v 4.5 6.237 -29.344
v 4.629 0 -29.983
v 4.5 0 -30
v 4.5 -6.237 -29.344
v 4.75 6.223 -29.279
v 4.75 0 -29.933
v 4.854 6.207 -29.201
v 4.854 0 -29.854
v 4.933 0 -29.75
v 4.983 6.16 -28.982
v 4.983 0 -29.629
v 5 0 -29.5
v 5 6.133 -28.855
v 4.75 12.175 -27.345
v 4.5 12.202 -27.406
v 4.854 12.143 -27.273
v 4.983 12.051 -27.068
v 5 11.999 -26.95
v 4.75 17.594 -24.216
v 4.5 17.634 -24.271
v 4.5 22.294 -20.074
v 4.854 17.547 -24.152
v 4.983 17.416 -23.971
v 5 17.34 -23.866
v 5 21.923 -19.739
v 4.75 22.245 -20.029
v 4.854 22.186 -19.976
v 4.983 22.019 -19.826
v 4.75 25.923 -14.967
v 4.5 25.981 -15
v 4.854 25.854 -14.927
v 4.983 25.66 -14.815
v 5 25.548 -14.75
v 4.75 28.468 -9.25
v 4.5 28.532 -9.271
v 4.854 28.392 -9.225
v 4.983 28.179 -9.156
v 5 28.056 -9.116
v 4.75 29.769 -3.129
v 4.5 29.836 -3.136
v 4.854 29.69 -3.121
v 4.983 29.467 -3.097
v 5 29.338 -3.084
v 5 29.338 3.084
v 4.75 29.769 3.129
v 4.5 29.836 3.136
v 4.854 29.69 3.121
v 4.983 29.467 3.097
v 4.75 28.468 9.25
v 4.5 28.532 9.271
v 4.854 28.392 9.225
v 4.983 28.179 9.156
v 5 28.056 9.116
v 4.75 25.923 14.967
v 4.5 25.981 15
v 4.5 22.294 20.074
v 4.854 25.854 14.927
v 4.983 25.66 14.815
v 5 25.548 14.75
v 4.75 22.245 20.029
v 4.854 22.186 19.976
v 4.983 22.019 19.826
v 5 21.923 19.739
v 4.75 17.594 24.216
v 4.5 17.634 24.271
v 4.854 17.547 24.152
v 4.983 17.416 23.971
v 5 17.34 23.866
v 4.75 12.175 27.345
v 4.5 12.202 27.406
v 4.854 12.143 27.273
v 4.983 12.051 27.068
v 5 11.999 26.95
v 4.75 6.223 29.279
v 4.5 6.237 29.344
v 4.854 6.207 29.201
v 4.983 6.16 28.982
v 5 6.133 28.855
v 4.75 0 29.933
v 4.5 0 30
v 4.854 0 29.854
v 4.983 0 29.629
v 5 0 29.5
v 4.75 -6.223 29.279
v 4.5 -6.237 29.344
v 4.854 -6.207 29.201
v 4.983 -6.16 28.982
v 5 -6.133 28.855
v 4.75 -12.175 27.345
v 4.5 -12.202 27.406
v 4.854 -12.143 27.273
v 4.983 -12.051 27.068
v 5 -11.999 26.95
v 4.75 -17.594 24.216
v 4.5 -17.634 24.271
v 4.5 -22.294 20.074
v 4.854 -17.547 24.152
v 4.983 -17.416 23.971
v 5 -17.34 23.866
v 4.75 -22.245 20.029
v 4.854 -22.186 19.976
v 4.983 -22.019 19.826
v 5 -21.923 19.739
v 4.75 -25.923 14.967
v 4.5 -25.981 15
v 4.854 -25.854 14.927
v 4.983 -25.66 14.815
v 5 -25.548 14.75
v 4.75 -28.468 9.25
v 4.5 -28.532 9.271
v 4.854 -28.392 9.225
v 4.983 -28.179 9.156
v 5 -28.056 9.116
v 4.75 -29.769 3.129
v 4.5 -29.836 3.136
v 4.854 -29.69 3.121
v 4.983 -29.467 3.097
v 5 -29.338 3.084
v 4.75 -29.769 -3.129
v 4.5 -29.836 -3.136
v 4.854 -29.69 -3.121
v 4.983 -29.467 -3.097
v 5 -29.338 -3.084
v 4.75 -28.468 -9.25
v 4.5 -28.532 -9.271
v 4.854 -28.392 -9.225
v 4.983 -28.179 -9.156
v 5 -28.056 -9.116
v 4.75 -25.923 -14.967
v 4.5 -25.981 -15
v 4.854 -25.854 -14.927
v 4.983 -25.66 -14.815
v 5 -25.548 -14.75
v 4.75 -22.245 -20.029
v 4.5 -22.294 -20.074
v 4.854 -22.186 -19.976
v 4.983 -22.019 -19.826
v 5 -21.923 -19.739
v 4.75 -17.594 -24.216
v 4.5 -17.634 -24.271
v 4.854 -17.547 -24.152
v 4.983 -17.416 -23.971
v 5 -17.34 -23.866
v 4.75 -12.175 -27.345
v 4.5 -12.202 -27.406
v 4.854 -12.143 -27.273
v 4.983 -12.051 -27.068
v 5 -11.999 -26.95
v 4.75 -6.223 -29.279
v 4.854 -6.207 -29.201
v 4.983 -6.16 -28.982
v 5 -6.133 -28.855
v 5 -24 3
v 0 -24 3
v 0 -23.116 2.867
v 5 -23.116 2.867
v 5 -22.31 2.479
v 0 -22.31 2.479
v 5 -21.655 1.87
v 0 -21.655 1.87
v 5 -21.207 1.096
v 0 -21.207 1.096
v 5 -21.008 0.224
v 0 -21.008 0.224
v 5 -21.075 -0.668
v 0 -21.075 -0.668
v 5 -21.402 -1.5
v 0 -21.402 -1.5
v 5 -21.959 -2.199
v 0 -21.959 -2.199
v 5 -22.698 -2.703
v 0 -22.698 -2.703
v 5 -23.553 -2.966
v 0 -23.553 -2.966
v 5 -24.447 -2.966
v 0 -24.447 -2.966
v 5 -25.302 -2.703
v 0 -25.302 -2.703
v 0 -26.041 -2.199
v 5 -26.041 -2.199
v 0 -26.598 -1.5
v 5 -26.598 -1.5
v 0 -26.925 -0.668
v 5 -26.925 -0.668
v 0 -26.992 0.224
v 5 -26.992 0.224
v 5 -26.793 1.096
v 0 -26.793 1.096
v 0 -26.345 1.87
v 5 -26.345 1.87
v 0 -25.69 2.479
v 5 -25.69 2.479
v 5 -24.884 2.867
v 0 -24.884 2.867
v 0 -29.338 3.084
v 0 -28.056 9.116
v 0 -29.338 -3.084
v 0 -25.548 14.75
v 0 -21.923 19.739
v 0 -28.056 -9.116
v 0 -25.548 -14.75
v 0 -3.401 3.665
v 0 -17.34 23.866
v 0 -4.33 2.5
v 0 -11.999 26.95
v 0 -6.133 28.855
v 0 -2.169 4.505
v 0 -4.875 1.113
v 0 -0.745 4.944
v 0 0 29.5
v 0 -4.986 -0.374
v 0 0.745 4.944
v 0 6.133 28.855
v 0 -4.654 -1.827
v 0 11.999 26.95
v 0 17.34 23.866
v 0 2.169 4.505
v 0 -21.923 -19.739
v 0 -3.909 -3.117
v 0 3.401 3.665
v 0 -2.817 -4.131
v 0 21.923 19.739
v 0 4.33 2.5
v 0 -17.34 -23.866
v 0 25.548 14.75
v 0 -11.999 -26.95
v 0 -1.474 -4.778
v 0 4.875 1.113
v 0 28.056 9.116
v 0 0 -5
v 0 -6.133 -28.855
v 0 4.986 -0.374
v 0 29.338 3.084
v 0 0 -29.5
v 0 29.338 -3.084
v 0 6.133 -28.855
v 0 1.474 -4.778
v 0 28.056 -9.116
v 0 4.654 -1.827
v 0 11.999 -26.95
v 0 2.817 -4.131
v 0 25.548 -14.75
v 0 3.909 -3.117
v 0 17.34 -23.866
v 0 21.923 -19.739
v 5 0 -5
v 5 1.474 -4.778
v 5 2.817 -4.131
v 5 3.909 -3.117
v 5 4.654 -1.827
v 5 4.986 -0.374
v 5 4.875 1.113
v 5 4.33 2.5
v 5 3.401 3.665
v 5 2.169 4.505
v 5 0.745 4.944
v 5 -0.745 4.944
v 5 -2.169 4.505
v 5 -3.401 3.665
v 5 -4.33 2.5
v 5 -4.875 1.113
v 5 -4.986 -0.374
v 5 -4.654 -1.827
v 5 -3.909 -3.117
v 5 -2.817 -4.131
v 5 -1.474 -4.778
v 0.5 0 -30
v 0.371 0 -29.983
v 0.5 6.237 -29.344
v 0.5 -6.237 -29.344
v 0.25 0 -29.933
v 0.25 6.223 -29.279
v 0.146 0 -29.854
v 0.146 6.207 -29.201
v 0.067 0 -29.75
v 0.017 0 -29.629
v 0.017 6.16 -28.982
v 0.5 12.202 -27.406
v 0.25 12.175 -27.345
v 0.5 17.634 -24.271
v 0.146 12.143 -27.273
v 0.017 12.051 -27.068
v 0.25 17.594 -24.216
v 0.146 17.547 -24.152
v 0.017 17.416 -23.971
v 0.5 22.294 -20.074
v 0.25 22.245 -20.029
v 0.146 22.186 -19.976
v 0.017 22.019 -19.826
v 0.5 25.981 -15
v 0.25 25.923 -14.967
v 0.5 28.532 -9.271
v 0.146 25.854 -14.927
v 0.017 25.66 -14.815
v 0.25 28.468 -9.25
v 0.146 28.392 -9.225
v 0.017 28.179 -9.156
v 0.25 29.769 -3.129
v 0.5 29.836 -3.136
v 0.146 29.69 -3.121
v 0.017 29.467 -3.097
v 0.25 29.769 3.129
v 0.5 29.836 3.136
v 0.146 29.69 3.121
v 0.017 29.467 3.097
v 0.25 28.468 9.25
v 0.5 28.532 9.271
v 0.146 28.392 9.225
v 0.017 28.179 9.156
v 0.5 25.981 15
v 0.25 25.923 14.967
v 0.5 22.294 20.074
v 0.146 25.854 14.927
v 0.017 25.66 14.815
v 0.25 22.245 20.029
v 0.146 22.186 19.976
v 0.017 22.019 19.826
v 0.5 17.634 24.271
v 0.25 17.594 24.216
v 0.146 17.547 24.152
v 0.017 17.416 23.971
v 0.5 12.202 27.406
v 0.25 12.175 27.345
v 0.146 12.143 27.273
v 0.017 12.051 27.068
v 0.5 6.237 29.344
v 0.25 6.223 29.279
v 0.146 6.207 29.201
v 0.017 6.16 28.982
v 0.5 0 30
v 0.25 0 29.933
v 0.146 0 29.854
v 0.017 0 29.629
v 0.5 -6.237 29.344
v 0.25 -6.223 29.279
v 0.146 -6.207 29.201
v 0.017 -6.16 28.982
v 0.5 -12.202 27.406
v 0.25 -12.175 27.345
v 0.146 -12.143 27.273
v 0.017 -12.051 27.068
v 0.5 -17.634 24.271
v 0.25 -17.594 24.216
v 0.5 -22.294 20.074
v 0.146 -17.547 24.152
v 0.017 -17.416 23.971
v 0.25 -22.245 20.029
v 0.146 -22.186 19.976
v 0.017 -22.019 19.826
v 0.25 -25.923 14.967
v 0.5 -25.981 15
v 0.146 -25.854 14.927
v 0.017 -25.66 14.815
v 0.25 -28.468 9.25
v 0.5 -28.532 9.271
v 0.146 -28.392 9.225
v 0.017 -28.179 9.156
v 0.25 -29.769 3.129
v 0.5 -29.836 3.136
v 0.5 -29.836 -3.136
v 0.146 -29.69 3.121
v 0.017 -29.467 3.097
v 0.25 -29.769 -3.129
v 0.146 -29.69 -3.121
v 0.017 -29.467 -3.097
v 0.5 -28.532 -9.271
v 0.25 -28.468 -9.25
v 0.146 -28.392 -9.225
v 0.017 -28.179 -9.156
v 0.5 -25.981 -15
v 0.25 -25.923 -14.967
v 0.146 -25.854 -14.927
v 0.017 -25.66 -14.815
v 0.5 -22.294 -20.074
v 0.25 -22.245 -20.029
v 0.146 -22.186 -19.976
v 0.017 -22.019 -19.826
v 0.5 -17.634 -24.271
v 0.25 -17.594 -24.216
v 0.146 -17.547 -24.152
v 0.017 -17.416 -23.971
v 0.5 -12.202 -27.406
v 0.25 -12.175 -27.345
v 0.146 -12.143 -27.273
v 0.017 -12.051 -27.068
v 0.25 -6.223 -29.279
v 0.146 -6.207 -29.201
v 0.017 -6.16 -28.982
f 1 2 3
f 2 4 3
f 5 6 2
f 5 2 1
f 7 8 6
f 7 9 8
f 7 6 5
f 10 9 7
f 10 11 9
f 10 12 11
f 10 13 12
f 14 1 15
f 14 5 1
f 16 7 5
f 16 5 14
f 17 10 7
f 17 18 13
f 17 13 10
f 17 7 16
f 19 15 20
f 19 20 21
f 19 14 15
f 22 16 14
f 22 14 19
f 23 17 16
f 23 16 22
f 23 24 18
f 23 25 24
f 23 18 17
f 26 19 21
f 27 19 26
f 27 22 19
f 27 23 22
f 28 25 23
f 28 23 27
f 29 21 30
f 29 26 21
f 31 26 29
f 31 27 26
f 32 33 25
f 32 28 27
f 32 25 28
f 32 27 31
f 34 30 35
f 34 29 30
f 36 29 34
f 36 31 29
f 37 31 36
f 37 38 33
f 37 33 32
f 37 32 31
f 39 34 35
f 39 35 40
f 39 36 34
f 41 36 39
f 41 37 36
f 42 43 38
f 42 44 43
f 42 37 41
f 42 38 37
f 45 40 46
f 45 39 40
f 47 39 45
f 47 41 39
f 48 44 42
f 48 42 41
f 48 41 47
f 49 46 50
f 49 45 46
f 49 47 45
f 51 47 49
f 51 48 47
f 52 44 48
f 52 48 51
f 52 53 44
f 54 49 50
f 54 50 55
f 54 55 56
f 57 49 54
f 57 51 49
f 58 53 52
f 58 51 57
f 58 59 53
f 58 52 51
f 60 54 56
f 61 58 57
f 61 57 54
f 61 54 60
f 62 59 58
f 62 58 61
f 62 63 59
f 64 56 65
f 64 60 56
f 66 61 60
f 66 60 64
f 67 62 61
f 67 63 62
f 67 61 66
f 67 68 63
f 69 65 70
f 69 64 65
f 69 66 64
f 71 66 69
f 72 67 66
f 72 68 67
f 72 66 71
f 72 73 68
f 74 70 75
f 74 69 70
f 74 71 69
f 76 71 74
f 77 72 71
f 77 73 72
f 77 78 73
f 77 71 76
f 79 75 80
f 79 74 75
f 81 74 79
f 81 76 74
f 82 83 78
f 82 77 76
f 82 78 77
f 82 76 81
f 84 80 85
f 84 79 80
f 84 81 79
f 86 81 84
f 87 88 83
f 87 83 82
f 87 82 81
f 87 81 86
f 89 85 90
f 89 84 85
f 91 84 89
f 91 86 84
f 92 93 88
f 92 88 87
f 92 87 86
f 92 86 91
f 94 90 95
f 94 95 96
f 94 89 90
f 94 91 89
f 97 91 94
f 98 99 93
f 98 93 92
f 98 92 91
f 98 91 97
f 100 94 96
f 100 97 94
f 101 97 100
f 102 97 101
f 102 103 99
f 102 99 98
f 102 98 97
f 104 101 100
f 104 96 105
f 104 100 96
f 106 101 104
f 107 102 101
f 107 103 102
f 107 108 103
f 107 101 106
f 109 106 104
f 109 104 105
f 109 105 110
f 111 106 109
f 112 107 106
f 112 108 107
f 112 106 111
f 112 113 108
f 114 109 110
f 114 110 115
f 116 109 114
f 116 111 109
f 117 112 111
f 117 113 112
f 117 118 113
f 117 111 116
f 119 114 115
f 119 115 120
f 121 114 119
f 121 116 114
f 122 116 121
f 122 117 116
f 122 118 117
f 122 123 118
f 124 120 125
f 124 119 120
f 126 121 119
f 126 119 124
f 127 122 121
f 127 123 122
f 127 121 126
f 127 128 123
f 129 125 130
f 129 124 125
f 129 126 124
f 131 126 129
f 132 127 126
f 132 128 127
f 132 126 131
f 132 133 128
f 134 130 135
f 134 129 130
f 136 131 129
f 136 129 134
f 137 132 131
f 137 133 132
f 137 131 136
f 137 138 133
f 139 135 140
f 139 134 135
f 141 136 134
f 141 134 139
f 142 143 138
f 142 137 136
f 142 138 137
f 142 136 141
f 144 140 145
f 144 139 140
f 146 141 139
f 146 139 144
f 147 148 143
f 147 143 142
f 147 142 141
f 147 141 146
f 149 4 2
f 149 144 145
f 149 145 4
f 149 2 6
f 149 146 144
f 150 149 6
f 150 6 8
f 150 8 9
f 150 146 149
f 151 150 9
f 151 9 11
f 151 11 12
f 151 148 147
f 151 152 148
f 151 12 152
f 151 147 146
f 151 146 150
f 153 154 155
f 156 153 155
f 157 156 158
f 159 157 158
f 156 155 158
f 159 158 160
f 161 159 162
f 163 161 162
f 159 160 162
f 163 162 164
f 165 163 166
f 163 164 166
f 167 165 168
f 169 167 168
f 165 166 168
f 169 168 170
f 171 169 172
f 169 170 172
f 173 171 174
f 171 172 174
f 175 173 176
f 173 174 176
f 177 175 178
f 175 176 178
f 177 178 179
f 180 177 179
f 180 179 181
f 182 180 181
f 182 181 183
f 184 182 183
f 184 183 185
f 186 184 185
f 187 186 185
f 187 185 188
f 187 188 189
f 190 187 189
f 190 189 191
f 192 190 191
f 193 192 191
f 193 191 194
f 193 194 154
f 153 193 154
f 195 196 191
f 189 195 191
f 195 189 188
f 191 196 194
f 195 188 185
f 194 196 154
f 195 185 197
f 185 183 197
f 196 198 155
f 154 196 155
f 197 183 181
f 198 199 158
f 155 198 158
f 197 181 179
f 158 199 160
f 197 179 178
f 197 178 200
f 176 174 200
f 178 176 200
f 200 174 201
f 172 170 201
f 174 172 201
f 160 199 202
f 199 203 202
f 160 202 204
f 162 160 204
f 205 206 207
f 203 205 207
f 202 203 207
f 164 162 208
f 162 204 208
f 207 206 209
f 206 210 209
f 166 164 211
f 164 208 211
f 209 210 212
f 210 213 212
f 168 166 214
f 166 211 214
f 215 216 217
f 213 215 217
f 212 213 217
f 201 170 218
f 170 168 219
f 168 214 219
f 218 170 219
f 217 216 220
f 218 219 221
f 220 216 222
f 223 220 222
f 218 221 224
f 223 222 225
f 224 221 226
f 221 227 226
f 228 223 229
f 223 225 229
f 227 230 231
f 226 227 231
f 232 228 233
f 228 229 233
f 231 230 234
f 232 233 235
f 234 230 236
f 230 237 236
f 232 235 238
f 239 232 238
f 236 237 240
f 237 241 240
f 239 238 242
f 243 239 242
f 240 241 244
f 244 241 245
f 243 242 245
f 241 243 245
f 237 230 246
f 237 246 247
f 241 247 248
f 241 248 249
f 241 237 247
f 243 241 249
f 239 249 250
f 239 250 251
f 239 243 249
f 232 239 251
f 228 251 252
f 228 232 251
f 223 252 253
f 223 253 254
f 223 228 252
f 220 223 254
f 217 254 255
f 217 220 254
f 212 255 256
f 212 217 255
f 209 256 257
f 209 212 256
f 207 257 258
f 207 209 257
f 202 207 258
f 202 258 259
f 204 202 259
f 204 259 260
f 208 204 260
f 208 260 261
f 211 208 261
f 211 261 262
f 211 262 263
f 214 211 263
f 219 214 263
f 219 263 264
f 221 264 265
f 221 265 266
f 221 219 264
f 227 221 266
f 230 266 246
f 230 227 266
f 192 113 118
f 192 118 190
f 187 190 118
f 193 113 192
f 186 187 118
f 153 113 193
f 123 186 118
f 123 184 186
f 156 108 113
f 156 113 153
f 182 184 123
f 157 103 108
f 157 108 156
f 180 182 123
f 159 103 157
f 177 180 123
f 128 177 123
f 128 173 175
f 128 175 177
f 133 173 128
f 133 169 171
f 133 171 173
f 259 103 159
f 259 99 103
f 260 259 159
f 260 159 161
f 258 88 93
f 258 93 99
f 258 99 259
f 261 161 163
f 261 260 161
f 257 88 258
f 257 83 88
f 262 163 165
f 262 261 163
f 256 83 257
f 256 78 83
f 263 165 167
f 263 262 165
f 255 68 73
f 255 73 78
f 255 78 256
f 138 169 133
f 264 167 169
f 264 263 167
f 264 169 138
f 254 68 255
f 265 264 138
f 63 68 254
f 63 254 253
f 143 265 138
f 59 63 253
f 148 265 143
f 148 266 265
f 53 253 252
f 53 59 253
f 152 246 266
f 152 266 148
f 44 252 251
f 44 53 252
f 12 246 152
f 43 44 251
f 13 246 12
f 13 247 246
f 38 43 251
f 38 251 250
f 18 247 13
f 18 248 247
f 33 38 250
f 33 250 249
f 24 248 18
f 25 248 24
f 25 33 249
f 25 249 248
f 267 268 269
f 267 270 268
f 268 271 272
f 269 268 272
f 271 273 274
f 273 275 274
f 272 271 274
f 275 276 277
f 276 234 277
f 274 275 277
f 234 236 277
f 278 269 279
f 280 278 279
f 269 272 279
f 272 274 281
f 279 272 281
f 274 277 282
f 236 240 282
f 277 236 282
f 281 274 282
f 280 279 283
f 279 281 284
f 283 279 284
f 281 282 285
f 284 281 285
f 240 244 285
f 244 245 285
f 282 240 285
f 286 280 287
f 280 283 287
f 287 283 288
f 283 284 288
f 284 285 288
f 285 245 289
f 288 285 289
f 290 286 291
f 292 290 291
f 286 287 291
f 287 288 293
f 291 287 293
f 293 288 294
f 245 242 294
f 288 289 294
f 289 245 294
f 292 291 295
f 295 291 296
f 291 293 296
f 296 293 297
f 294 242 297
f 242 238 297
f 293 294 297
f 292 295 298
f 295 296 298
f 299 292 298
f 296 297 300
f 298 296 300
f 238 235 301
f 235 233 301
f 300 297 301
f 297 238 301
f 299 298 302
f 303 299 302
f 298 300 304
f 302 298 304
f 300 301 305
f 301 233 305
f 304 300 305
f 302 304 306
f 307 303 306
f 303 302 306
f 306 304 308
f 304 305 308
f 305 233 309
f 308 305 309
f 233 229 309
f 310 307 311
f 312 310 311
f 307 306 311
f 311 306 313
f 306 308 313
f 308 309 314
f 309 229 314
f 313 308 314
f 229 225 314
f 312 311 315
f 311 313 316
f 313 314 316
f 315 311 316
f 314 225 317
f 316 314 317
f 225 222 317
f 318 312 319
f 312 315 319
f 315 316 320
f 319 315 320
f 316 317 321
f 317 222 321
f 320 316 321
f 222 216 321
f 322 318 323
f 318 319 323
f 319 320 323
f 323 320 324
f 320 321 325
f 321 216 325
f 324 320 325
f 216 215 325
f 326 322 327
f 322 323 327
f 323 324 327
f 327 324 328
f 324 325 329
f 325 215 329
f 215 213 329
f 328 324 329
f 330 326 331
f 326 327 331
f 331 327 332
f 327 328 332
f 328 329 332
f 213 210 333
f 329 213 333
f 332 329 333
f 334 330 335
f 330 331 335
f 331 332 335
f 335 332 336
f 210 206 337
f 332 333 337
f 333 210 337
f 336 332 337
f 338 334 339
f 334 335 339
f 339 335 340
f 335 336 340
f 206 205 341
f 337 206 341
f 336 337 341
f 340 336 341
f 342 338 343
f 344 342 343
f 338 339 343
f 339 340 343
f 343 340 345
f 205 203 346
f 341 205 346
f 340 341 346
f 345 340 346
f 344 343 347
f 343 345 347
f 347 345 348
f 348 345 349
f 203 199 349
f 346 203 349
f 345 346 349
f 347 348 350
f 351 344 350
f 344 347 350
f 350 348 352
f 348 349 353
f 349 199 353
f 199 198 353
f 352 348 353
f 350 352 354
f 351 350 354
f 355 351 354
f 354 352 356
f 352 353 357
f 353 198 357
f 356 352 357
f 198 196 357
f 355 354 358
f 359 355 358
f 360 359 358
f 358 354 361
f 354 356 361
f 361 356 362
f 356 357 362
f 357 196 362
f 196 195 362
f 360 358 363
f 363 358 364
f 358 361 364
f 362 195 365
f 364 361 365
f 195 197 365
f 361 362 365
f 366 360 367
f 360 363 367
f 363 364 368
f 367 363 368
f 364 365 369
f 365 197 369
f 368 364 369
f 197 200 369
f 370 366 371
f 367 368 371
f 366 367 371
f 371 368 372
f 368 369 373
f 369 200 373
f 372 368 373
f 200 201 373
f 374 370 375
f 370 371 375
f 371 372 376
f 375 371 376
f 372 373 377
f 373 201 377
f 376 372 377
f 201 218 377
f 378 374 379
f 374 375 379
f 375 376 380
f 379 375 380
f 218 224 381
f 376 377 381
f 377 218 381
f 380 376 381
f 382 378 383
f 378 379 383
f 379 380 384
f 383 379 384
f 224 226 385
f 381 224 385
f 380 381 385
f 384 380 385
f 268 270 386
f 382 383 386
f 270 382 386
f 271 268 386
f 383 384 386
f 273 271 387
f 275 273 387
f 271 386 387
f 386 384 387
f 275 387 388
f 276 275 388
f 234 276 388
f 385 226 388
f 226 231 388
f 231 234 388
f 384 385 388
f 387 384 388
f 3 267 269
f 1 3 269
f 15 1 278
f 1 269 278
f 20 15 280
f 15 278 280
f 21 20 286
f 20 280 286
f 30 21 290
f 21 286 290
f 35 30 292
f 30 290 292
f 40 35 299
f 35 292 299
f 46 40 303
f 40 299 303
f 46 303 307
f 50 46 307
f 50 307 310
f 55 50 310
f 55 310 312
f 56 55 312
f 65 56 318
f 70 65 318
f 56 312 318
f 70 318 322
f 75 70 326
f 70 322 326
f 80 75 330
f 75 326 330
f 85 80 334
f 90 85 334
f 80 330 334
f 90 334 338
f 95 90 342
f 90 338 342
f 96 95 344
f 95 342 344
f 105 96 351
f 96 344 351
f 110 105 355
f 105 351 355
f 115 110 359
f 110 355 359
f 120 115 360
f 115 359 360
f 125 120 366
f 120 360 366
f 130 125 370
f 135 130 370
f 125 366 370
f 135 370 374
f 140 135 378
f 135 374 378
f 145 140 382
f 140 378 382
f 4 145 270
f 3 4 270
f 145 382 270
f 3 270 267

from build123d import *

# Parameters (mm, degrees)
SKICA1_R                 = 30
SKICA1_R_2               = 5
P_IDAT_VYSUNUT_M1_DEPTH  = 5
ODEBRAT_VYSUNUT_M1_REACH = 7
SKICA2_R                 = 3
ZAOBLIT1_R               = 0.5


with BuildPart() as part:
    # Skica1 → Přidat vysunutím1 (new body)
    with BuildSketch(Plane(origin=(0, 0, 0), x_dir=(0, 0, -1), z_dir=(1, 0, 0))):
        Circle(SKICA1_R)
        Circle(SKICA1_R_2, mode=Mode.SUBTRACT)
    extrude(amount=P_IDAT_VYSUNUT_M1_DEPTH)

    # Skica2 → Odebrat vysunutím1 (cut, up to next)
    with BuildSketch(Plane.ZY, mode=Mode.PRIVATE) as odebrat_vysunut_m1_sk1:
        with Locations((0, -24)):
            Circle(SKICA2_R)
    odebrat_vysunut_m1_tool1 = extrude(odebrat_vysunut_m1_sk1.sketch, amount=-ODEBRAT_VYSUNUT_M1_REACH, mode=Mode.PRIVATE) & part.part
    add(odebrat_vysunut_m1_tool1.solids().sort_by_distance((0, -24, 0))[0], mode=Mode.SUBTRACT)

    # Zaoblit1
    zaoblit1_edges = [part.edges().sort_by_distance(p)[0] for p in [
        (0, 0, 30),
        (5, 0, 30),
    ]]
    fillet(zaoblit1_edges, radius=ZAOBLIT1_R)


solid = part.part
